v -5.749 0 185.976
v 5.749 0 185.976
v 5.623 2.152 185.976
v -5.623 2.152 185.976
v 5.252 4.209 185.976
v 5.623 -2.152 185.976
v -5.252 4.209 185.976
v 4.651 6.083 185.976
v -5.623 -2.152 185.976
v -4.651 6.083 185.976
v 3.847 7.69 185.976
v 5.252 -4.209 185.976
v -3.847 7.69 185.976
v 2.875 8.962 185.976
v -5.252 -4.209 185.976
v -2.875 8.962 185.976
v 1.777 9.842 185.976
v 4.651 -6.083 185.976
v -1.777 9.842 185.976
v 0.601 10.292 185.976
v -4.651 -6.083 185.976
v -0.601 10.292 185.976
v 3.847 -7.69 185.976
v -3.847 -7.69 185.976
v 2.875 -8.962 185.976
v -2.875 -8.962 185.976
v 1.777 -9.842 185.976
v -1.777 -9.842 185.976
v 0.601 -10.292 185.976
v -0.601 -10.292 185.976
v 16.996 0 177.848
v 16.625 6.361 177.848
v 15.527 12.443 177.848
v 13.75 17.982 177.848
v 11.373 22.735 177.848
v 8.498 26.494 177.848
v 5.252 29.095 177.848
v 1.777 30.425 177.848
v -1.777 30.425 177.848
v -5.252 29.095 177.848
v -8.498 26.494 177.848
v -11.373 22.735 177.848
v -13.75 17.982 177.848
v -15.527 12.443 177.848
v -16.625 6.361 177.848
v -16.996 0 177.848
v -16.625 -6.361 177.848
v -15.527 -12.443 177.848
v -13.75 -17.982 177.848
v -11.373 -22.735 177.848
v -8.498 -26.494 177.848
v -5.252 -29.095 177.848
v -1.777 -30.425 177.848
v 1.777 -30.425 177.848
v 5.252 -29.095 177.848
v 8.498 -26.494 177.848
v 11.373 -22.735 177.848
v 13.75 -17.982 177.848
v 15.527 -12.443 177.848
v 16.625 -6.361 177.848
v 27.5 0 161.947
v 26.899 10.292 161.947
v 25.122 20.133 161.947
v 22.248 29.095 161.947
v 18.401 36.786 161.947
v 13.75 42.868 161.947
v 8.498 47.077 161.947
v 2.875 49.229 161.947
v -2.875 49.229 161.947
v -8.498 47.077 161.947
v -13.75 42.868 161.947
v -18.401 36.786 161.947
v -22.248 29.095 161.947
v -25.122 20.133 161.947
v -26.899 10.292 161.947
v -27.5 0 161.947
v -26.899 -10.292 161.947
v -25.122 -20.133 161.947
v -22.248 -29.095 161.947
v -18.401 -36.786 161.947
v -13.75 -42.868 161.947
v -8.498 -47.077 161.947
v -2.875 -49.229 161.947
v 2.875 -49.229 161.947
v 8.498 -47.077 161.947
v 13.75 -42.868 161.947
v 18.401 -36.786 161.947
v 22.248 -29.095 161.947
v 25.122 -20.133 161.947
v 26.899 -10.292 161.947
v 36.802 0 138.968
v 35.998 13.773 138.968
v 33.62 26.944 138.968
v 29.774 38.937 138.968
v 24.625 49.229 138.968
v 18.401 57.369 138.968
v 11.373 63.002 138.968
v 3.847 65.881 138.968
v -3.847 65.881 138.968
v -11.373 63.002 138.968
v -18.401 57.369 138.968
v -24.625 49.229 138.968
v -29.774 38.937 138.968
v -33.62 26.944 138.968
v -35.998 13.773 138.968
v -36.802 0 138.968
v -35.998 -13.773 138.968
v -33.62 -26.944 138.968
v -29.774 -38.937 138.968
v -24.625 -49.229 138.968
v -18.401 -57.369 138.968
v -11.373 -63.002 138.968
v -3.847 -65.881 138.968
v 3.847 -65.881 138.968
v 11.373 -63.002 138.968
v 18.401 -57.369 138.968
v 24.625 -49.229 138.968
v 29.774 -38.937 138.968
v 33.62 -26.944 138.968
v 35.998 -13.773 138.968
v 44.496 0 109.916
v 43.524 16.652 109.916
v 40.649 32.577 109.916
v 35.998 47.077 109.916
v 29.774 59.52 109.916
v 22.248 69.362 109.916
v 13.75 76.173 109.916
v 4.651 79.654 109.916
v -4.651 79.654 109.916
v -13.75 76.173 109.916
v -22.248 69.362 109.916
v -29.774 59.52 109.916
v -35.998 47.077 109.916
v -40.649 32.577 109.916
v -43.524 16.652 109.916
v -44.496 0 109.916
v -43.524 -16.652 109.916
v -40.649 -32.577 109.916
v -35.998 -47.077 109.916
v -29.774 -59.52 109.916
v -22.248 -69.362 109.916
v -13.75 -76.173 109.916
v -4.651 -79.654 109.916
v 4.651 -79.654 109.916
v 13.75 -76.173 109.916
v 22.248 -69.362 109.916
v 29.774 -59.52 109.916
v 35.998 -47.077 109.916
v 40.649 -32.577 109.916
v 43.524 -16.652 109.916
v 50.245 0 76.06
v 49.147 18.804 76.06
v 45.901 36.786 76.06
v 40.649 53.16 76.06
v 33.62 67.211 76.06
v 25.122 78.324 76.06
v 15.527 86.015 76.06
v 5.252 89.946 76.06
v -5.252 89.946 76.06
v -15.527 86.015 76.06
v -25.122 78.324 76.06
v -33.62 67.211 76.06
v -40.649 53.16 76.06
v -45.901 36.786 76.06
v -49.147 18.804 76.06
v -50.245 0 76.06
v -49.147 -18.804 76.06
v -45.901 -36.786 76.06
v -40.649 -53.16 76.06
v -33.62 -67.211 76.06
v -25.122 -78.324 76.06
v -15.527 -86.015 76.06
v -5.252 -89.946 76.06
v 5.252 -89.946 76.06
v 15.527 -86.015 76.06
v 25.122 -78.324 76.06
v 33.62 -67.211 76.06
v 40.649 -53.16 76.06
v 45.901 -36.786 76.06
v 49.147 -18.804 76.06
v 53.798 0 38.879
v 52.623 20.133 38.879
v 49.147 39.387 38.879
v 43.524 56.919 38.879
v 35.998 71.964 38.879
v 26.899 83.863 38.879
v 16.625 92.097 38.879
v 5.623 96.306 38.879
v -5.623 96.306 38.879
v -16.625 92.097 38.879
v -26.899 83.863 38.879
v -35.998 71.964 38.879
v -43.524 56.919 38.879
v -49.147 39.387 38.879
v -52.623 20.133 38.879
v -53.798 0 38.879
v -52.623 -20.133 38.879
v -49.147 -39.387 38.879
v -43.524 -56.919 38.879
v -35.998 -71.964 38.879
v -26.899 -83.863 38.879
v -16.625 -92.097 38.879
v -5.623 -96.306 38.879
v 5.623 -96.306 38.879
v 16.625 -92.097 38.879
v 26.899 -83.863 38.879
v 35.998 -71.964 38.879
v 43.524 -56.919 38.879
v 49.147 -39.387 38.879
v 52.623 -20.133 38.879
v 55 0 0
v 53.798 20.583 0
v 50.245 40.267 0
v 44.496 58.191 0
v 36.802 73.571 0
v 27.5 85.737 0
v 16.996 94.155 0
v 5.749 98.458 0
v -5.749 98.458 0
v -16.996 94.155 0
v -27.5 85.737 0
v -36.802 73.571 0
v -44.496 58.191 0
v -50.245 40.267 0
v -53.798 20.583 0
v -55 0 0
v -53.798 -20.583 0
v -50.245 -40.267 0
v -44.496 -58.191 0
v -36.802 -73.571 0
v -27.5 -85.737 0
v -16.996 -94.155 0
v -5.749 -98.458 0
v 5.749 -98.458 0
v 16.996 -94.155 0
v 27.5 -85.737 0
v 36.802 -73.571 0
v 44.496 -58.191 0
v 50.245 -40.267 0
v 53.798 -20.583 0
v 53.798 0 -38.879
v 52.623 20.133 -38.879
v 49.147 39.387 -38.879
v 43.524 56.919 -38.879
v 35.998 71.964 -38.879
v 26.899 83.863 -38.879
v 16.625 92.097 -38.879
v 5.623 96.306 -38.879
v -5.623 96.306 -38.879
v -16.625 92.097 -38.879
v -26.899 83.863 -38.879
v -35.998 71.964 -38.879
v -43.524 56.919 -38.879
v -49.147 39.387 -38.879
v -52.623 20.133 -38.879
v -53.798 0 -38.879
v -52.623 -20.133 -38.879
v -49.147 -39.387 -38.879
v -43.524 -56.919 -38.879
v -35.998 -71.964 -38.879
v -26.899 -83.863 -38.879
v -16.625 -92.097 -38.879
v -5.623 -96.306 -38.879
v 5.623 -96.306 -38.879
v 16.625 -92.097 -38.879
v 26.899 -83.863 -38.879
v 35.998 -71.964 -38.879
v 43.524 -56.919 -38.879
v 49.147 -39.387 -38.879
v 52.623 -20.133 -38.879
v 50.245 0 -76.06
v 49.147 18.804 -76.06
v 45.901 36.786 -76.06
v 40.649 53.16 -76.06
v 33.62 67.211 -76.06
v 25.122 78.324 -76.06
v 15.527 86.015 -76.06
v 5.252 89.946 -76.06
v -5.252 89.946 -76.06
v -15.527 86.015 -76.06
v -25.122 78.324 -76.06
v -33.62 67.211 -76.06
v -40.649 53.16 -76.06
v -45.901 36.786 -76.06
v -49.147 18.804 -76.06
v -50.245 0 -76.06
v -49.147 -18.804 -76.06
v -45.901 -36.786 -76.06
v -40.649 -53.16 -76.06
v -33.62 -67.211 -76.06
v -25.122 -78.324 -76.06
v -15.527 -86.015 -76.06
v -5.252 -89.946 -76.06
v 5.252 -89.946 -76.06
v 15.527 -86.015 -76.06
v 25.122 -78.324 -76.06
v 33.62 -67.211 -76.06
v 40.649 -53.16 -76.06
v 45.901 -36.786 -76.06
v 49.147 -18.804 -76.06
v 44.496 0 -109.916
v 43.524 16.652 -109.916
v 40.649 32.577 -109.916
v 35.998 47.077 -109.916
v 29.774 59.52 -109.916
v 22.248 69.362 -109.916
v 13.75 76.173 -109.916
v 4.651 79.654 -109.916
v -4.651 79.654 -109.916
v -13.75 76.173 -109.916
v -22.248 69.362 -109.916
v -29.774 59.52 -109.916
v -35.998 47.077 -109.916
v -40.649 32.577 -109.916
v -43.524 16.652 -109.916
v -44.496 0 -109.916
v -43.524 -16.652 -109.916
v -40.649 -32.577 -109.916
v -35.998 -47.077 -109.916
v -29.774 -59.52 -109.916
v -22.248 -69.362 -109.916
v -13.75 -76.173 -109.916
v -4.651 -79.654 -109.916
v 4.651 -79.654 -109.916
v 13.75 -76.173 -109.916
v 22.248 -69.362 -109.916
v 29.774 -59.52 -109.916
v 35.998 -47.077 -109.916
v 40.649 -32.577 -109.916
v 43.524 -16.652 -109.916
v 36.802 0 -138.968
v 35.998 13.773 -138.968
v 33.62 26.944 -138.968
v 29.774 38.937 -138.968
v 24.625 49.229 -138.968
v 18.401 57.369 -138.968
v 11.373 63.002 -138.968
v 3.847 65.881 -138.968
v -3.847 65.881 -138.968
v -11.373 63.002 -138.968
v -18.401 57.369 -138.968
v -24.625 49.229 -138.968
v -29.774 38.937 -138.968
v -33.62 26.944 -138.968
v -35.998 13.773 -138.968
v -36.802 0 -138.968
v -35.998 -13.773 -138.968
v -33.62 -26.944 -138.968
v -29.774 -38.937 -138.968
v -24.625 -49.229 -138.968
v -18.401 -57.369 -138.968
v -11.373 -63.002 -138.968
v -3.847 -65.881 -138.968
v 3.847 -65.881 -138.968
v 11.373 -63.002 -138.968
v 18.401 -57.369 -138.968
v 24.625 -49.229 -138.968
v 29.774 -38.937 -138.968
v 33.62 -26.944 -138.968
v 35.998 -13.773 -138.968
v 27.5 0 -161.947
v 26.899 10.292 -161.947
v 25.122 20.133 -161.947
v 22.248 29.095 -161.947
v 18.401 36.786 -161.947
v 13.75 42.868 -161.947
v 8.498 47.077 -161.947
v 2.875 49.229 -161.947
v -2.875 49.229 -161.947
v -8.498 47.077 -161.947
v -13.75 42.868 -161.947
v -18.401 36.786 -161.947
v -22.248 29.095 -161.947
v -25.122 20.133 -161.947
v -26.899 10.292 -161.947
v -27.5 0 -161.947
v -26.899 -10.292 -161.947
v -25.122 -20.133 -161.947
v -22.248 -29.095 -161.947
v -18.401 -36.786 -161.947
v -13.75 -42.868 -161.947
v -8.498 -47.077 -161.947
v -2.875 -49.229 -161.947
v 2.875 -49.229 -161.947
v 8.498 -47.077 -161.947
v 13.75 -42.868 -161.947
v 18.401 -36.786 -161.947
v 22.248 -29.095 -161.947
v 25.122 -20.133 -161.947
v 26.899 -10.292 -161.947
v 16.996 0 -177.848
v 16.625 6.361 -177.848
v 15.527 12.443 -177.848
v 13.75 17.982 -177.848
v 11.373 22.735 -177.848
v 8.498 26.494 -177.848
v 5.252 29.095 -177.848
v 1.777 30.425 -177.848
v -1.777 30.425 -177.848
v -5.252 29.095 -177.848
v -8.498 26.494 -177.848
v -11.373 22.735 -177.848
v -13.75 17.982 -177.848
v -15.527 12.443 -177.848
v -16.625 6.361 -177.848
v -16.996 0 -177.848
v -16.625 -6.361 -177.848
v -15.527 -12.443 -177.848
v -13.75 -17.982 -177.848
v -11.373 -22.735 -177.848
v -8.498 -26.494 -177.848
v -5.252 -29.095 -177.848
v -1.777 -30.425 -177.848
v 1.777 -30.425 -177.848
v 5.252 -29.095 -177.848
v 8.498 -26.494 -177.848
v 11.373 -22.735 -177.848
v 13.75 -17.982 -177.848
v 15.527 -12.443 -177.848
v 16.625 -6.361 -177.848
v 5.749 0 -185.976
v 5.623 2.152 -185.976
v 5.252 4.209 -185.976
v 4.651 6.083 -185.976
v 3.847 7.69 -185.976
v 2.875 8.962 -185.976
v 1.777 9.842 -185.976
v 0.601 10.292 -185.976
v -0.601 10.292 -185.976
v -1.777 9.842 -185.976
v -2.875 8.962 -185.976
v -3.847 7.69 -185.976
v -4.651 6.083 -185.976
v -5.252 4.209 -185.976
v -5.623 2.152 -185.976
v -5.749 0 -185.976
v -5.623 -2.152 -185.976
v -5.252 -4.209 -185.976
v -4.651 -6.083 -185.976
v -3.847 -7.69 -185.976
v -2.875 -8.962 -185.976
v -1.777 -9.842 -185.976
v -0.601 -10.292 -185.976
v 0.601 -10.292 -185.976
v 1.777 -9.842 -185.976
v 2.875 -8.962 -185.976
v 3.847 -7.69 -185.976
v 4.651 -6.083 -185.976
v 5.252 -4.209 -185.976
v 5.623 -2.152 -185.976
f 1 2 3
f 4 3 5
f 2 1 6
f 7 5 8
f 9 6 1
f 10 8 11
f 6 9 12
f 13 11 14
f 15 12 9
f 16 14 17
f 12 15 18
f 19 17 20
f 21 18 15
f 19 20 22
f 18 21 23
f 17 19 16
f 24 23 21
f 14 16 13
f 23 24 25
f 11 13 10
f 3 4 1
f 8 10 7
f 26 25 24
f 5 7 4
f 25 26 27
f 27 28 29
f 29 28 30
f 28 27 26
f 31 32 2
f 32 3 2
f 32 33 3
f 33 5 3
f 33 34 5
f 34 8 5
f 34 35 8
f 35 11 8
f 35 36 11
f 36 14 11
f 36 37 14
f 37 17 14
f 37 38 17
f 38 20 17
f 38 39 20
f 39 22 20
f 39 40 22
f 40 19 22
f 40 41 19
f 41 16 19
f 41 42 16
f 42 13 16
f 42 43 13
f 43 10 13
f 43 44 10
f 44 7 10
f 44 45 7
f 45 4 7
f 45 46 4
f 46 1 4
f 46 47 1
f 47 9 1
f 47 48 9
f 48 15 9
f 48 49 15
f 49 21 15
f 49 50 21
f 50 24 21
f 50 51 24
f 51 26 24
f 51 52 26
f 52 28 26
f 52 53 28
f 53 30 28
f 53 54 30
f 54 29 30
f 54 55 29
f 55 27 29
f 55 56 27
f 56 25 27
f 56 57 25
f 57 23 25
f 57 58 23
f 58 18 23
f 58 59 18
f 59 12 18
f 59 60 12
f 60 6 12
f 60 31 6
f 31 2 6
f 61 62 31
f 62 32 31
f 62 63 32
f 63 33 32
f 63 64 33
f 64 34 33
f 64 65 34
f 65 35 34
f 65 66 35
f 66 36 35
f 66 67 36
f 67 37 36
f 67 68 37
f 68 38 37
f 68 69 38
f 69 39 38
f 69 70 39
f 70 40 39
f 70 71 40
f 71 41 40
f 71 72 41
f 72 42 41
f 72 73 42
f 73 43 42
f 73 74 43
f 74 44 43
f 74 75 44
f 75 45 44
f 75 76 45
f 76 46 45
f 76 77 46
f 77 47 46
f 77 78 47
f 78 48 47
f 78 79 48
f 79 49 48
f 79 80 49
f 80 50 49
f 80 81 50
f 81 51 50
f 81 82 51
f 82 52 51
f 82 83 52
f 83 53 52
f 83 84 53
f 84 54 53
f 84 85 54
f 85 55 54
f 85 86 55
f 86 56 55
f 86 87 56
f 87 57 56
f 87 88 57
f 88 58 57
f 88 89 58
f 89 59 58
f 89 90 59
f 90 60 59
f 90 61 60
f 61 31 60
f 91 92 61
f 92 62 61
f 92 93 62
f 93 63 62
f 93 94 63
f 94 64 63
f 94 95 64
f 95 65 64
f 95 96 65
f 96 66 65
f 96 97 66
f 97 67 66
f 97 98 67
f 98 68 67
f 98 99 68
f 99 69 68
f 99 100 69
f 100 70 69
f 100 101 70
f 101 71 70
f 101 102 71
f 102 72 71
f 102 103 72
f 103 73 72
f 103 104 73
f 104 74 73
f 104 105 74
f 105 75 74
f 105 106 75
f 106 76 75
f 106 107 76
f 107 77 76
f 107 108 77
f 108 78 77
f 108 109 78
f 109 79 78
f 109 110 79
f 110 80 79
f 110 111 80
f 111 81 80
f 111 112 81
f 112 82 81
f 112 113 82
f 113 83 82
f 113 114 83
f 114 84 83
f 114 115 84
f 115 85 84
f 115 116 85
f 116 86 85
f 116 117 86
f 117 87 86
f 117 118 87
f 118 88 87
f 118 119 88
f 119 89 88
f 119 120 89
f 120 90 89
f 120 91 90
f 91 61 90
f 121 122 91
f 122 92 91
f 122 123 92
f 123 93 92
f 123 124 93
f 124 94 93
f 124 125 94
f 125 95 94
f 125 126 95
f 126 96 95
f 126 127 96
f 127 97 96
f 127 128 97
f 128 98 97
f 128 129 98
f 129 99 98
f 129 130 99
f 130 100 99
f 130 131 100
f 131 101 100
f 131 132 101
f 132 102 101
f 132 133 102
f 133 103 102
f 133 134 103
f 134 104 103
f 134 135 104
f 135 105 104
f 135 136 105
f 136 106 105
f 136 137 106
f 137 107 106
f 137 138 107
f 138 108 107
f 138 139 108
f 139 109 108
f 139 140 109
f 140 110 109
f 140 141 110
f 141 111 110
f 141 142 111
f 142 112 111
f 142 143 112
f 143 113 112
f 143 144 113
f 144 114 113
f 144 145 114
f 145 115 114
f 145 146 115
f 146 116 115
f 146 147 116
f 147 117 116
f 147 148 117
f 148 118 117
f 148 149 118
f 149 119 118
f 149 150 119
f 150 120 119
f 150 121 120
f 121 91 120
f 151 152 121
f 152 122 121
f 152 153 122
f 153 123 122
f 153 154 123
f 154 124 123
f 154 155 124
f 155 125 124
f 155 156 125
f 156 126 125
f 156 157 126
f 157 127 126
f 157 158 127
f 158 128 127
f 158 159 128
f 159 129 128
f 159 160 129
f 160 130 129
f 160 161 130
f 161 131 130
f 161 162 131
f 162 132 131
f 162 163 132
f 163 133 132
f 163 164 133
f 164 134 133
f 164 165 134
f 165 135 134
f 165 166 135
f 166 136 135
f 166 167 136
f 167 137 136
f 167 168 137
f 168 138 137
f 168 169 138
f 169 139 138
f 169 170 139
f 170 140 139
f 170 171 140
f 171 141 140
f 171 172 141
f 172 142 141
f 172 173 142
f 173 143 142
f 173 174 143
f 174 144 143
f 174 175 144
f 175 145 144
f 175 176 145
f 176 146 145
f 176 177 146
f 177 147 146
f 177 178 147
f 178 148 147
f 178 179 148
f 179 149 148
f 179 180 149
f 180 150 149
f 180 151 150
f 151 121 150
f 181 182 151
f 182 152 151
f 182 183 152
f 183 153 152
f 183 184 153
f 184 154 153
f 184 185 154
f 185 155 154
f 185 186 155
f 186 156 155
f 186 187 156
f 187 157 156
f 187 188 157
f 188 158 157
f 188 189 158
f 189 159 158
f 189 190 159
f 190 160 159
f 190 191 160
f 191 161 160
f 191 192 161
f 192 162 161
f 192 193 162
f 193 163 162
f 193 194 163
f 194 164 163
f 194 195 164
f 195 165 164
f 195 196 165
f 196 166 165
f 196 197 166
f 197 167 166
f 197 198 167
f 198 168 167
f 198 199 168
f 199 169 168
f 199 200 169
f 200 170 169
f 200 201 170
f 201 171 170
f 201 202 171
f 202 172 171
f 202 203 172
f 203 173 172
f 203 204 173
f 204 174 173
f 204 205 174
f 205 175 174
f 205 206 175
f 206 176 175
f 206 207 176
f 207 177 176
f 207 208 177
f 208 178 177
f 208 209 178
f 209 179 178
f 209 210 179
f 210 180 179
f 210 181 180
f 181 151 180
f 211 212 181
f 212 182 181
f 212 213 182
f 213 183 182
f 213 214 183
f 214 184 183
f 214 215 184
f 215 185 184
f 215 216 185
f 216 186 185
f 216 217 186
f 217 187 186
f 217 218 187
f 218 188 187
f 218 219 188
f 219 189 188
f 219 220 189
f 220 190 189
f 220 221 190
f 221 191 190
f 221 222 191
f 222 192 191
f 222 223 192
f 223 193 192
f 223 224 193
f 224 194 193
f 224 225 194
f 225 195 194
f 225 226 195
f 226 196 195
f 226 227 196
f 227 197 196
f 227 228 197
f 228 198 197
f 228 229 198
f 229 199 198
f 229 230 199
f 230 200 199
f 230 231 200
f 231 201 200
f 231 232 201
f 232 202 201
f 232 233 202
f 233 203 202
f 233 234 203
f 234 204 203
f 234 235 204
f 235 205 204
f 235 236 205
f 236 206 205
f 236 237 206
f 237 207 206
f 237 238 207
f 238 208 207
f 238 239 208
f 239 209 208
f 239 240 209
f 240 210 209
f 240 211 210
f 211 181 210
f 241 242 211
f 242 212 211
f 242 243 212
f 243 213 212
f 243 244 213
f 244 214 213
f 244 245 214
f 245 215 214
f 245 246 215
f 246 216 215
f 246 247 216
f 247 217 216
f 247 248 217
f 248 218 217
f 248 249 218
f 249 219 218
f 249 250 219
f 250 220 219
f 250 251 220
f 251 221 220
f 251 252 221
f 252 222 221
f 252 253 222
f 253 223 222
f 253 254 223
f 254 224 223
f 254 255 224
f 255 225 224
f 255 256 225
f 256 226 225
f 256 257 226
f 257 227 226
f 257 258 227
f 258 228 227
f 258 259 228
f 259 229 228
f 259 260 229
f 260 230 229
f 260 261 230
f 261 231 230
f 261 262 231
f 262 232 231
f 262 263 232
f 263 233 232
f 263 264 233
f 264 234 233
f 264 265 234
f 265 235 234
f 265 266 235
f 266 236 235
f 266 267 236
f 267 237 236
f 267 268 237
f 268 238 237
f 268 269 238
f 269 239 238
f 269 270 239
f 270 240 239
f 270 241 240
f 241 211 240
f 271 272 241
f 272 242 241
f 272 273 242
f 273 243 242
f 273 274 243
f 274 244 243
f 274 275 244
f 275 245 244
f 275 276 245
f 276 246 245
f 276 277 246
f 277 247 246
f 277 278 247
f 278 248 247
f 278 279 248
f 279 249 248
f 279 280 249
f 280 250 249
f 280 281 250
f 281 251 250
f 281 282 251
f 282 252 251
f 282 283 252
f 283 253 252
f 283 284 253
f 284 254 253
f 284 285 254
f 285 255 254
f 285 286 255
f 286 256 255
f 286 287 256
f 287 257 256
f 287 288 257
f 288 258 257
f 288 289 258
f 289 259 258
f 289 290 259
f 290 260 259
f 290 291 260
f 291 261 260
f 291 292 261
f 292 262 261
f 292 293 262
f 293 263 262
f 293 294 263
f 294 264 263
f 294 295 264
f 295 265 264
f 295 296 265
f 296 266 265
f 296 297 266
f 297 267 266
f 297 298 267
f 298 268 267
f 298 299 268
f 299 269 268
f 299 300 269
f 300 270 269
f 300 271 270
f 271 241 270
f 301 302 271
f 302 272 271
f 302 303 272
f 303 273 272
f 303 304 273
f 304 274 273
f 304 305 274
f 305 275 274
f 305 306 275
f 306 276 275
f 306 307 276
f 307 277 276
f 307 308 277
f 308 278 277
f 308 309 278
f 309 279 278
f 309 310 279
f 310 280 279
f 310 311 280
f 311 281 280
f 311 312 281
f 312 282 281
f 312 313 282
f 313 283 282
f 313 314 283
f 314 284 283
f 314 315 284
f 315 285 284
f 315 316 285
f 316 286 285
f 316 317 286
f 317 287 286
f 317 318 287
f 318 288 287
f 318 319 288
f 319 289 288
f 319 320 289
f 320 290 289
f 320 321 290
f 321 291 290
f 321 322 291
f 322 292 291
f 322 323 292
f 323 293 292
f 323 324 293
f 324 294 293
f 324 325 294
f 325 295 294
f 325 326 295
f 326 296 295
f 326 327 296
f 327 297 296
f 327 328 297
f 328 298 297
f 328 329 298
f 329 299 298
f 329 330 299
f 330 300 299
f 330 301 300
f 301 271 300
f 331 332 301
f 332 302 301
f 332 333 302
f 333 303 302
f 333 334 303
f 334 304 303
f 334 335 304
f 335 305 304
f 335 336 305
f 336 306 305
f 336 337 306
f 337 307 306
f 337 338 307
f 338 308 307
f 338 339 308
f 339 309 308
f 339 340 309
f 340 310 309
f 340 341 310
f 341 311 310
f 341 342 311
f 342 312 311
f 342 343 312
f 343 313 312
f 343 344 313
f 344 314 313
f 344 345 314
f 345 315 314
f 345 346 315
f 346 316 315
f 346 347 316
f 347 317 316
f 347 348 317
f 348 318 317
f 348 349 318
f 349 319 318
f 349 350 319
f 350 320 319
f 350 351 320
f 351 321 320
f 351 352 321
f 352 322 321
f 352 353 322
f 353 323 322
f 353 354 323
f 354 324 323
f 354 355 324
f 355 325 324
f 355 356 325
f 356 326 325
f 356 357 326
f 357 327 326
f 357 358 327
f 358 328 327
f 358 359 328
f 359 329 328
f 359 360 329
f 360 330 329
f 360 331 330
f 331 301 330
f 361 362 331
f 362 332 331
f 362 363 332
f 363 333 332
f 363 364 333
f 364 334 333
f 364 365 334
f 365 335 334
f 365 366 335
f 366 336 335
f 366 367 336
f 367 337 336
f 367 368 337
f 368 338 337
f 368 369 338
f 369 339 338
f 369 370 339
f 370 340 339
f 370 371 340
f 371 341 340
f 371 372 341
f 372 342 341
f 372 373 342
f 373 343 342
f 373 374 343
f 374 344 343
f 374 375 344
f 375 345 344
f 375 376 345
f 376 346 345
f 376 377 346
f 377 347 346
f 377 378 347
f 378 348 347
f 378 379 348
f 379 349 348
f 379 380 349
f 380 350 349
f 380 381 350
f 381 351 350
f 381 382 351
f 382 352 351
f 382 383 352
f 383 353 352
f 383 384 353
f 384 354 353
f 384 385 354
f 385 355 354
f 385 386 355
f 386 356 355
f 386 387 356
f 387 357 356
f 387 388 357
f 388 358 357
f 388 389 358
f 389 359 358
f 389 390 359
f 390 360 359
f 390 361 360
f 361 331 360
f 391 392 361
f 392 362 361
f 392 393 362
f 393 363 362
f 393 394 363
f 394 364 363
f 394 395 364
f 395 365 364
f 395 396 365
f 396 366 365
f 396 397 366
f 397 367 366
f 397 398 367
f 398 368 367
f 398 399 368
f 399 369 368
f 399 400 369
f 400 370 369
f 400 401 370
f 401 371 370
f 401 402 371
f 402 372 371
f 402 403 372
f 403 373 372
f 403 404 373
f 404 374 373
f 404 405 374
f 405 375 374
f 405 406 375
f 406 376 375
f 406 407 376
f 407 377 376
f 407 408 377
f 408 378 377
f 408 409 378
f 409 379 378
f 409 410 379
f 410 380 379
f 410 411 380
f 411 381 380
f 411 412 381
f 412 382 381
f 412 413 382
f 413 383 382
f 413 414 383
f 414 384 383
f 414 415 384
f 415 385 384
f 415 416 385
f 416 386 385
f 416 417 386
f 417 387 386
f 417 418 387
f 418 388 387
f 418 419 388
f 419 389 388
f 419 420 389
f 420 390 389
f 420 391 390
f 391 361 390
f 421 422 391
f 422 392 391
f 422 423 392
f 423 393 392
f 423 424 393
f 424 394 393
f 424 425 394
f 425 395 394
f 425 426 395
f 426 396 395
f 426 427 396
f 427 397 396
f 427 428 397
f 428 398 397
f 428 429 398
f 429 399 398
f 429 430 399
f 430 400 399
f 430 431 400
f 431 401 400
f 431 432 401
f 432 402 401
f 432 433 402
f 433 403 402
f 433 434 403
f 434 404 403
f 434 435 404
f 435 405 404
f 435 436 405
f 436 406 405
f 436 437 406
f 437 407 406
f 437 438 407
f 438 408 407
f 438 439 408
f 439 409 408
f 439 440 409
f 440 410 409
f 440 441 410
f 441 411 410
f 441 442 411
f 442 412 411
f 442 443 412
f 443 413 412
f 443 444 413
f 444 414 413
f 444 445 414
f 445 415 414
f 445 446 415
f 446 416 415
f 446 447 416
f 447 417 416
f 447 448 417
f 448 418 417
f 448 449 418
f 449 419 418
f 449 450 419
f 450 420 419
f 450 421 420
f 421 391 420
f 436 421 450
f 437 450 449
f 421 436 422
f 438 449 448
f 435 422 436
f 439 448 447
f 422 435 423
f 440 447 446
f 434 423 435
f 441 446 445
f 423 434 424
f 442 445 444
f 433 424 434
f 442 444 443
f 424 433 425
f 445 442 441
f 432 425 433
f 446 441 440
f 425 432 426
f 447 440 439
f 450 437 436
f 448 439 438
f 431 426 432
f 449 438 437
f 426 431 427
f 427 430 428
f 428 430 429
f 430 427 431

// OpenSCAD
// Generated by SolidPython 1.0.1 on 2020-07-29 00:46:46


scale(v = [5, 9, 17]) {
	sphere(r = 11);
}
/***********************************************
*********      SolidPython code:      **********
************************************************
 
# import packages: SolidPython
from solid import *
from solid.utils import *
from itertools import chain, combinations, permutations


class Resize:

    def __init__(self, scad_file):
        self.scad_file = scad_file
        #self.scad_file = import_scad(scad_file)
        # cone/cylinder param:
        self.r1 = 0
        self.r2 = 0
        self.h = 0
        # rectangular prism param:
        self.w = 0
        self.l = 0
        # ellipse param:
        self.r = 0

    # import OpenScad code (file name corresponds to shape)


    # classify shape + parameters
    def assign(self, param1, param2, param3):
        if self.scad_file == 'cone.scad':
            self.r1 = param1
            self.r2 = param2
            self.h = param3
        elif self.scad_file == 'cylinder.scad':
            self.r1 = param1
            self.r2 = param2
            self.h = param3
        elif self.scad_file == 'rectangularPrism.scad':
            self.h = param1
            self.l = param2
            self.w = param3
        else:
            self.r = param1
            self.h = param2

    # resize parameters
    def iterate(self):
        x = range(3, 20, 2)
        i = 1
        if self.scad_file == 'cone.scad':
            tempList = list(permutations(x, 2))
            for temp in tempList:
                param1 = temp[0]
                param2 = temp[1]
                filepath = 'produced_scad_files/' + 'cone' + str(param1) + '_' + str(param2) + '_' + '.scad'
                scad_render_to_file(cylinder(h=param1, r1=param2, r2=0), filepath)

        elif self.scad_file == 'cylinder.scad':
            tempList = list(permutations(x, 3))
            for temp in tempList:
                param1 = temp[0]
                param2 = temp[1]
                filepath = 'produced_scad_files/' + 'cylinder' + str(param1) + '_' + str(param2) + '_' + '.scad'
                scad_render_to_file(cylinder(h=param1, r1=param2, r2=param2), filepath)

        elif self.scad_file == 'rectangularPrism.scad':
            tempList = list(permutations(x, 3))
            for temp in tempList:
                param1 = temp[0]
                param2 = temp[1]
                param3 = temp[2]
                filepath = 'produced_scad_files/' + 'rectangularPrism' + str(param1) + '_' + str(param2) + '_' + str(
                    param3) + '.scad'
                scad_render_to_file(cube(size=(param1, param2, param3)), filepath)

        elif self.scad_file == 'ellipse.scad':
            tempList = list(permutations(x, 4))
            for temp in tempList:
                param1 = temp[0]
                param2 = temp[1]
                param3 = temp[2]
                param4 = temp[3]
                filepath = 'produced_scad_files/' + 'ellipse' + str(param1) + '_' + str(param2) + '_' + str(param3) + '_' + str(param4) + '.scad'
                scad_render_to_file(scale([param1, param2, param3])(sphere(r=param4)), filepath)

    def render_to_scadfile(self):
        scad_render_to_file(scad, 'example.scad') 
 
************************************************/
